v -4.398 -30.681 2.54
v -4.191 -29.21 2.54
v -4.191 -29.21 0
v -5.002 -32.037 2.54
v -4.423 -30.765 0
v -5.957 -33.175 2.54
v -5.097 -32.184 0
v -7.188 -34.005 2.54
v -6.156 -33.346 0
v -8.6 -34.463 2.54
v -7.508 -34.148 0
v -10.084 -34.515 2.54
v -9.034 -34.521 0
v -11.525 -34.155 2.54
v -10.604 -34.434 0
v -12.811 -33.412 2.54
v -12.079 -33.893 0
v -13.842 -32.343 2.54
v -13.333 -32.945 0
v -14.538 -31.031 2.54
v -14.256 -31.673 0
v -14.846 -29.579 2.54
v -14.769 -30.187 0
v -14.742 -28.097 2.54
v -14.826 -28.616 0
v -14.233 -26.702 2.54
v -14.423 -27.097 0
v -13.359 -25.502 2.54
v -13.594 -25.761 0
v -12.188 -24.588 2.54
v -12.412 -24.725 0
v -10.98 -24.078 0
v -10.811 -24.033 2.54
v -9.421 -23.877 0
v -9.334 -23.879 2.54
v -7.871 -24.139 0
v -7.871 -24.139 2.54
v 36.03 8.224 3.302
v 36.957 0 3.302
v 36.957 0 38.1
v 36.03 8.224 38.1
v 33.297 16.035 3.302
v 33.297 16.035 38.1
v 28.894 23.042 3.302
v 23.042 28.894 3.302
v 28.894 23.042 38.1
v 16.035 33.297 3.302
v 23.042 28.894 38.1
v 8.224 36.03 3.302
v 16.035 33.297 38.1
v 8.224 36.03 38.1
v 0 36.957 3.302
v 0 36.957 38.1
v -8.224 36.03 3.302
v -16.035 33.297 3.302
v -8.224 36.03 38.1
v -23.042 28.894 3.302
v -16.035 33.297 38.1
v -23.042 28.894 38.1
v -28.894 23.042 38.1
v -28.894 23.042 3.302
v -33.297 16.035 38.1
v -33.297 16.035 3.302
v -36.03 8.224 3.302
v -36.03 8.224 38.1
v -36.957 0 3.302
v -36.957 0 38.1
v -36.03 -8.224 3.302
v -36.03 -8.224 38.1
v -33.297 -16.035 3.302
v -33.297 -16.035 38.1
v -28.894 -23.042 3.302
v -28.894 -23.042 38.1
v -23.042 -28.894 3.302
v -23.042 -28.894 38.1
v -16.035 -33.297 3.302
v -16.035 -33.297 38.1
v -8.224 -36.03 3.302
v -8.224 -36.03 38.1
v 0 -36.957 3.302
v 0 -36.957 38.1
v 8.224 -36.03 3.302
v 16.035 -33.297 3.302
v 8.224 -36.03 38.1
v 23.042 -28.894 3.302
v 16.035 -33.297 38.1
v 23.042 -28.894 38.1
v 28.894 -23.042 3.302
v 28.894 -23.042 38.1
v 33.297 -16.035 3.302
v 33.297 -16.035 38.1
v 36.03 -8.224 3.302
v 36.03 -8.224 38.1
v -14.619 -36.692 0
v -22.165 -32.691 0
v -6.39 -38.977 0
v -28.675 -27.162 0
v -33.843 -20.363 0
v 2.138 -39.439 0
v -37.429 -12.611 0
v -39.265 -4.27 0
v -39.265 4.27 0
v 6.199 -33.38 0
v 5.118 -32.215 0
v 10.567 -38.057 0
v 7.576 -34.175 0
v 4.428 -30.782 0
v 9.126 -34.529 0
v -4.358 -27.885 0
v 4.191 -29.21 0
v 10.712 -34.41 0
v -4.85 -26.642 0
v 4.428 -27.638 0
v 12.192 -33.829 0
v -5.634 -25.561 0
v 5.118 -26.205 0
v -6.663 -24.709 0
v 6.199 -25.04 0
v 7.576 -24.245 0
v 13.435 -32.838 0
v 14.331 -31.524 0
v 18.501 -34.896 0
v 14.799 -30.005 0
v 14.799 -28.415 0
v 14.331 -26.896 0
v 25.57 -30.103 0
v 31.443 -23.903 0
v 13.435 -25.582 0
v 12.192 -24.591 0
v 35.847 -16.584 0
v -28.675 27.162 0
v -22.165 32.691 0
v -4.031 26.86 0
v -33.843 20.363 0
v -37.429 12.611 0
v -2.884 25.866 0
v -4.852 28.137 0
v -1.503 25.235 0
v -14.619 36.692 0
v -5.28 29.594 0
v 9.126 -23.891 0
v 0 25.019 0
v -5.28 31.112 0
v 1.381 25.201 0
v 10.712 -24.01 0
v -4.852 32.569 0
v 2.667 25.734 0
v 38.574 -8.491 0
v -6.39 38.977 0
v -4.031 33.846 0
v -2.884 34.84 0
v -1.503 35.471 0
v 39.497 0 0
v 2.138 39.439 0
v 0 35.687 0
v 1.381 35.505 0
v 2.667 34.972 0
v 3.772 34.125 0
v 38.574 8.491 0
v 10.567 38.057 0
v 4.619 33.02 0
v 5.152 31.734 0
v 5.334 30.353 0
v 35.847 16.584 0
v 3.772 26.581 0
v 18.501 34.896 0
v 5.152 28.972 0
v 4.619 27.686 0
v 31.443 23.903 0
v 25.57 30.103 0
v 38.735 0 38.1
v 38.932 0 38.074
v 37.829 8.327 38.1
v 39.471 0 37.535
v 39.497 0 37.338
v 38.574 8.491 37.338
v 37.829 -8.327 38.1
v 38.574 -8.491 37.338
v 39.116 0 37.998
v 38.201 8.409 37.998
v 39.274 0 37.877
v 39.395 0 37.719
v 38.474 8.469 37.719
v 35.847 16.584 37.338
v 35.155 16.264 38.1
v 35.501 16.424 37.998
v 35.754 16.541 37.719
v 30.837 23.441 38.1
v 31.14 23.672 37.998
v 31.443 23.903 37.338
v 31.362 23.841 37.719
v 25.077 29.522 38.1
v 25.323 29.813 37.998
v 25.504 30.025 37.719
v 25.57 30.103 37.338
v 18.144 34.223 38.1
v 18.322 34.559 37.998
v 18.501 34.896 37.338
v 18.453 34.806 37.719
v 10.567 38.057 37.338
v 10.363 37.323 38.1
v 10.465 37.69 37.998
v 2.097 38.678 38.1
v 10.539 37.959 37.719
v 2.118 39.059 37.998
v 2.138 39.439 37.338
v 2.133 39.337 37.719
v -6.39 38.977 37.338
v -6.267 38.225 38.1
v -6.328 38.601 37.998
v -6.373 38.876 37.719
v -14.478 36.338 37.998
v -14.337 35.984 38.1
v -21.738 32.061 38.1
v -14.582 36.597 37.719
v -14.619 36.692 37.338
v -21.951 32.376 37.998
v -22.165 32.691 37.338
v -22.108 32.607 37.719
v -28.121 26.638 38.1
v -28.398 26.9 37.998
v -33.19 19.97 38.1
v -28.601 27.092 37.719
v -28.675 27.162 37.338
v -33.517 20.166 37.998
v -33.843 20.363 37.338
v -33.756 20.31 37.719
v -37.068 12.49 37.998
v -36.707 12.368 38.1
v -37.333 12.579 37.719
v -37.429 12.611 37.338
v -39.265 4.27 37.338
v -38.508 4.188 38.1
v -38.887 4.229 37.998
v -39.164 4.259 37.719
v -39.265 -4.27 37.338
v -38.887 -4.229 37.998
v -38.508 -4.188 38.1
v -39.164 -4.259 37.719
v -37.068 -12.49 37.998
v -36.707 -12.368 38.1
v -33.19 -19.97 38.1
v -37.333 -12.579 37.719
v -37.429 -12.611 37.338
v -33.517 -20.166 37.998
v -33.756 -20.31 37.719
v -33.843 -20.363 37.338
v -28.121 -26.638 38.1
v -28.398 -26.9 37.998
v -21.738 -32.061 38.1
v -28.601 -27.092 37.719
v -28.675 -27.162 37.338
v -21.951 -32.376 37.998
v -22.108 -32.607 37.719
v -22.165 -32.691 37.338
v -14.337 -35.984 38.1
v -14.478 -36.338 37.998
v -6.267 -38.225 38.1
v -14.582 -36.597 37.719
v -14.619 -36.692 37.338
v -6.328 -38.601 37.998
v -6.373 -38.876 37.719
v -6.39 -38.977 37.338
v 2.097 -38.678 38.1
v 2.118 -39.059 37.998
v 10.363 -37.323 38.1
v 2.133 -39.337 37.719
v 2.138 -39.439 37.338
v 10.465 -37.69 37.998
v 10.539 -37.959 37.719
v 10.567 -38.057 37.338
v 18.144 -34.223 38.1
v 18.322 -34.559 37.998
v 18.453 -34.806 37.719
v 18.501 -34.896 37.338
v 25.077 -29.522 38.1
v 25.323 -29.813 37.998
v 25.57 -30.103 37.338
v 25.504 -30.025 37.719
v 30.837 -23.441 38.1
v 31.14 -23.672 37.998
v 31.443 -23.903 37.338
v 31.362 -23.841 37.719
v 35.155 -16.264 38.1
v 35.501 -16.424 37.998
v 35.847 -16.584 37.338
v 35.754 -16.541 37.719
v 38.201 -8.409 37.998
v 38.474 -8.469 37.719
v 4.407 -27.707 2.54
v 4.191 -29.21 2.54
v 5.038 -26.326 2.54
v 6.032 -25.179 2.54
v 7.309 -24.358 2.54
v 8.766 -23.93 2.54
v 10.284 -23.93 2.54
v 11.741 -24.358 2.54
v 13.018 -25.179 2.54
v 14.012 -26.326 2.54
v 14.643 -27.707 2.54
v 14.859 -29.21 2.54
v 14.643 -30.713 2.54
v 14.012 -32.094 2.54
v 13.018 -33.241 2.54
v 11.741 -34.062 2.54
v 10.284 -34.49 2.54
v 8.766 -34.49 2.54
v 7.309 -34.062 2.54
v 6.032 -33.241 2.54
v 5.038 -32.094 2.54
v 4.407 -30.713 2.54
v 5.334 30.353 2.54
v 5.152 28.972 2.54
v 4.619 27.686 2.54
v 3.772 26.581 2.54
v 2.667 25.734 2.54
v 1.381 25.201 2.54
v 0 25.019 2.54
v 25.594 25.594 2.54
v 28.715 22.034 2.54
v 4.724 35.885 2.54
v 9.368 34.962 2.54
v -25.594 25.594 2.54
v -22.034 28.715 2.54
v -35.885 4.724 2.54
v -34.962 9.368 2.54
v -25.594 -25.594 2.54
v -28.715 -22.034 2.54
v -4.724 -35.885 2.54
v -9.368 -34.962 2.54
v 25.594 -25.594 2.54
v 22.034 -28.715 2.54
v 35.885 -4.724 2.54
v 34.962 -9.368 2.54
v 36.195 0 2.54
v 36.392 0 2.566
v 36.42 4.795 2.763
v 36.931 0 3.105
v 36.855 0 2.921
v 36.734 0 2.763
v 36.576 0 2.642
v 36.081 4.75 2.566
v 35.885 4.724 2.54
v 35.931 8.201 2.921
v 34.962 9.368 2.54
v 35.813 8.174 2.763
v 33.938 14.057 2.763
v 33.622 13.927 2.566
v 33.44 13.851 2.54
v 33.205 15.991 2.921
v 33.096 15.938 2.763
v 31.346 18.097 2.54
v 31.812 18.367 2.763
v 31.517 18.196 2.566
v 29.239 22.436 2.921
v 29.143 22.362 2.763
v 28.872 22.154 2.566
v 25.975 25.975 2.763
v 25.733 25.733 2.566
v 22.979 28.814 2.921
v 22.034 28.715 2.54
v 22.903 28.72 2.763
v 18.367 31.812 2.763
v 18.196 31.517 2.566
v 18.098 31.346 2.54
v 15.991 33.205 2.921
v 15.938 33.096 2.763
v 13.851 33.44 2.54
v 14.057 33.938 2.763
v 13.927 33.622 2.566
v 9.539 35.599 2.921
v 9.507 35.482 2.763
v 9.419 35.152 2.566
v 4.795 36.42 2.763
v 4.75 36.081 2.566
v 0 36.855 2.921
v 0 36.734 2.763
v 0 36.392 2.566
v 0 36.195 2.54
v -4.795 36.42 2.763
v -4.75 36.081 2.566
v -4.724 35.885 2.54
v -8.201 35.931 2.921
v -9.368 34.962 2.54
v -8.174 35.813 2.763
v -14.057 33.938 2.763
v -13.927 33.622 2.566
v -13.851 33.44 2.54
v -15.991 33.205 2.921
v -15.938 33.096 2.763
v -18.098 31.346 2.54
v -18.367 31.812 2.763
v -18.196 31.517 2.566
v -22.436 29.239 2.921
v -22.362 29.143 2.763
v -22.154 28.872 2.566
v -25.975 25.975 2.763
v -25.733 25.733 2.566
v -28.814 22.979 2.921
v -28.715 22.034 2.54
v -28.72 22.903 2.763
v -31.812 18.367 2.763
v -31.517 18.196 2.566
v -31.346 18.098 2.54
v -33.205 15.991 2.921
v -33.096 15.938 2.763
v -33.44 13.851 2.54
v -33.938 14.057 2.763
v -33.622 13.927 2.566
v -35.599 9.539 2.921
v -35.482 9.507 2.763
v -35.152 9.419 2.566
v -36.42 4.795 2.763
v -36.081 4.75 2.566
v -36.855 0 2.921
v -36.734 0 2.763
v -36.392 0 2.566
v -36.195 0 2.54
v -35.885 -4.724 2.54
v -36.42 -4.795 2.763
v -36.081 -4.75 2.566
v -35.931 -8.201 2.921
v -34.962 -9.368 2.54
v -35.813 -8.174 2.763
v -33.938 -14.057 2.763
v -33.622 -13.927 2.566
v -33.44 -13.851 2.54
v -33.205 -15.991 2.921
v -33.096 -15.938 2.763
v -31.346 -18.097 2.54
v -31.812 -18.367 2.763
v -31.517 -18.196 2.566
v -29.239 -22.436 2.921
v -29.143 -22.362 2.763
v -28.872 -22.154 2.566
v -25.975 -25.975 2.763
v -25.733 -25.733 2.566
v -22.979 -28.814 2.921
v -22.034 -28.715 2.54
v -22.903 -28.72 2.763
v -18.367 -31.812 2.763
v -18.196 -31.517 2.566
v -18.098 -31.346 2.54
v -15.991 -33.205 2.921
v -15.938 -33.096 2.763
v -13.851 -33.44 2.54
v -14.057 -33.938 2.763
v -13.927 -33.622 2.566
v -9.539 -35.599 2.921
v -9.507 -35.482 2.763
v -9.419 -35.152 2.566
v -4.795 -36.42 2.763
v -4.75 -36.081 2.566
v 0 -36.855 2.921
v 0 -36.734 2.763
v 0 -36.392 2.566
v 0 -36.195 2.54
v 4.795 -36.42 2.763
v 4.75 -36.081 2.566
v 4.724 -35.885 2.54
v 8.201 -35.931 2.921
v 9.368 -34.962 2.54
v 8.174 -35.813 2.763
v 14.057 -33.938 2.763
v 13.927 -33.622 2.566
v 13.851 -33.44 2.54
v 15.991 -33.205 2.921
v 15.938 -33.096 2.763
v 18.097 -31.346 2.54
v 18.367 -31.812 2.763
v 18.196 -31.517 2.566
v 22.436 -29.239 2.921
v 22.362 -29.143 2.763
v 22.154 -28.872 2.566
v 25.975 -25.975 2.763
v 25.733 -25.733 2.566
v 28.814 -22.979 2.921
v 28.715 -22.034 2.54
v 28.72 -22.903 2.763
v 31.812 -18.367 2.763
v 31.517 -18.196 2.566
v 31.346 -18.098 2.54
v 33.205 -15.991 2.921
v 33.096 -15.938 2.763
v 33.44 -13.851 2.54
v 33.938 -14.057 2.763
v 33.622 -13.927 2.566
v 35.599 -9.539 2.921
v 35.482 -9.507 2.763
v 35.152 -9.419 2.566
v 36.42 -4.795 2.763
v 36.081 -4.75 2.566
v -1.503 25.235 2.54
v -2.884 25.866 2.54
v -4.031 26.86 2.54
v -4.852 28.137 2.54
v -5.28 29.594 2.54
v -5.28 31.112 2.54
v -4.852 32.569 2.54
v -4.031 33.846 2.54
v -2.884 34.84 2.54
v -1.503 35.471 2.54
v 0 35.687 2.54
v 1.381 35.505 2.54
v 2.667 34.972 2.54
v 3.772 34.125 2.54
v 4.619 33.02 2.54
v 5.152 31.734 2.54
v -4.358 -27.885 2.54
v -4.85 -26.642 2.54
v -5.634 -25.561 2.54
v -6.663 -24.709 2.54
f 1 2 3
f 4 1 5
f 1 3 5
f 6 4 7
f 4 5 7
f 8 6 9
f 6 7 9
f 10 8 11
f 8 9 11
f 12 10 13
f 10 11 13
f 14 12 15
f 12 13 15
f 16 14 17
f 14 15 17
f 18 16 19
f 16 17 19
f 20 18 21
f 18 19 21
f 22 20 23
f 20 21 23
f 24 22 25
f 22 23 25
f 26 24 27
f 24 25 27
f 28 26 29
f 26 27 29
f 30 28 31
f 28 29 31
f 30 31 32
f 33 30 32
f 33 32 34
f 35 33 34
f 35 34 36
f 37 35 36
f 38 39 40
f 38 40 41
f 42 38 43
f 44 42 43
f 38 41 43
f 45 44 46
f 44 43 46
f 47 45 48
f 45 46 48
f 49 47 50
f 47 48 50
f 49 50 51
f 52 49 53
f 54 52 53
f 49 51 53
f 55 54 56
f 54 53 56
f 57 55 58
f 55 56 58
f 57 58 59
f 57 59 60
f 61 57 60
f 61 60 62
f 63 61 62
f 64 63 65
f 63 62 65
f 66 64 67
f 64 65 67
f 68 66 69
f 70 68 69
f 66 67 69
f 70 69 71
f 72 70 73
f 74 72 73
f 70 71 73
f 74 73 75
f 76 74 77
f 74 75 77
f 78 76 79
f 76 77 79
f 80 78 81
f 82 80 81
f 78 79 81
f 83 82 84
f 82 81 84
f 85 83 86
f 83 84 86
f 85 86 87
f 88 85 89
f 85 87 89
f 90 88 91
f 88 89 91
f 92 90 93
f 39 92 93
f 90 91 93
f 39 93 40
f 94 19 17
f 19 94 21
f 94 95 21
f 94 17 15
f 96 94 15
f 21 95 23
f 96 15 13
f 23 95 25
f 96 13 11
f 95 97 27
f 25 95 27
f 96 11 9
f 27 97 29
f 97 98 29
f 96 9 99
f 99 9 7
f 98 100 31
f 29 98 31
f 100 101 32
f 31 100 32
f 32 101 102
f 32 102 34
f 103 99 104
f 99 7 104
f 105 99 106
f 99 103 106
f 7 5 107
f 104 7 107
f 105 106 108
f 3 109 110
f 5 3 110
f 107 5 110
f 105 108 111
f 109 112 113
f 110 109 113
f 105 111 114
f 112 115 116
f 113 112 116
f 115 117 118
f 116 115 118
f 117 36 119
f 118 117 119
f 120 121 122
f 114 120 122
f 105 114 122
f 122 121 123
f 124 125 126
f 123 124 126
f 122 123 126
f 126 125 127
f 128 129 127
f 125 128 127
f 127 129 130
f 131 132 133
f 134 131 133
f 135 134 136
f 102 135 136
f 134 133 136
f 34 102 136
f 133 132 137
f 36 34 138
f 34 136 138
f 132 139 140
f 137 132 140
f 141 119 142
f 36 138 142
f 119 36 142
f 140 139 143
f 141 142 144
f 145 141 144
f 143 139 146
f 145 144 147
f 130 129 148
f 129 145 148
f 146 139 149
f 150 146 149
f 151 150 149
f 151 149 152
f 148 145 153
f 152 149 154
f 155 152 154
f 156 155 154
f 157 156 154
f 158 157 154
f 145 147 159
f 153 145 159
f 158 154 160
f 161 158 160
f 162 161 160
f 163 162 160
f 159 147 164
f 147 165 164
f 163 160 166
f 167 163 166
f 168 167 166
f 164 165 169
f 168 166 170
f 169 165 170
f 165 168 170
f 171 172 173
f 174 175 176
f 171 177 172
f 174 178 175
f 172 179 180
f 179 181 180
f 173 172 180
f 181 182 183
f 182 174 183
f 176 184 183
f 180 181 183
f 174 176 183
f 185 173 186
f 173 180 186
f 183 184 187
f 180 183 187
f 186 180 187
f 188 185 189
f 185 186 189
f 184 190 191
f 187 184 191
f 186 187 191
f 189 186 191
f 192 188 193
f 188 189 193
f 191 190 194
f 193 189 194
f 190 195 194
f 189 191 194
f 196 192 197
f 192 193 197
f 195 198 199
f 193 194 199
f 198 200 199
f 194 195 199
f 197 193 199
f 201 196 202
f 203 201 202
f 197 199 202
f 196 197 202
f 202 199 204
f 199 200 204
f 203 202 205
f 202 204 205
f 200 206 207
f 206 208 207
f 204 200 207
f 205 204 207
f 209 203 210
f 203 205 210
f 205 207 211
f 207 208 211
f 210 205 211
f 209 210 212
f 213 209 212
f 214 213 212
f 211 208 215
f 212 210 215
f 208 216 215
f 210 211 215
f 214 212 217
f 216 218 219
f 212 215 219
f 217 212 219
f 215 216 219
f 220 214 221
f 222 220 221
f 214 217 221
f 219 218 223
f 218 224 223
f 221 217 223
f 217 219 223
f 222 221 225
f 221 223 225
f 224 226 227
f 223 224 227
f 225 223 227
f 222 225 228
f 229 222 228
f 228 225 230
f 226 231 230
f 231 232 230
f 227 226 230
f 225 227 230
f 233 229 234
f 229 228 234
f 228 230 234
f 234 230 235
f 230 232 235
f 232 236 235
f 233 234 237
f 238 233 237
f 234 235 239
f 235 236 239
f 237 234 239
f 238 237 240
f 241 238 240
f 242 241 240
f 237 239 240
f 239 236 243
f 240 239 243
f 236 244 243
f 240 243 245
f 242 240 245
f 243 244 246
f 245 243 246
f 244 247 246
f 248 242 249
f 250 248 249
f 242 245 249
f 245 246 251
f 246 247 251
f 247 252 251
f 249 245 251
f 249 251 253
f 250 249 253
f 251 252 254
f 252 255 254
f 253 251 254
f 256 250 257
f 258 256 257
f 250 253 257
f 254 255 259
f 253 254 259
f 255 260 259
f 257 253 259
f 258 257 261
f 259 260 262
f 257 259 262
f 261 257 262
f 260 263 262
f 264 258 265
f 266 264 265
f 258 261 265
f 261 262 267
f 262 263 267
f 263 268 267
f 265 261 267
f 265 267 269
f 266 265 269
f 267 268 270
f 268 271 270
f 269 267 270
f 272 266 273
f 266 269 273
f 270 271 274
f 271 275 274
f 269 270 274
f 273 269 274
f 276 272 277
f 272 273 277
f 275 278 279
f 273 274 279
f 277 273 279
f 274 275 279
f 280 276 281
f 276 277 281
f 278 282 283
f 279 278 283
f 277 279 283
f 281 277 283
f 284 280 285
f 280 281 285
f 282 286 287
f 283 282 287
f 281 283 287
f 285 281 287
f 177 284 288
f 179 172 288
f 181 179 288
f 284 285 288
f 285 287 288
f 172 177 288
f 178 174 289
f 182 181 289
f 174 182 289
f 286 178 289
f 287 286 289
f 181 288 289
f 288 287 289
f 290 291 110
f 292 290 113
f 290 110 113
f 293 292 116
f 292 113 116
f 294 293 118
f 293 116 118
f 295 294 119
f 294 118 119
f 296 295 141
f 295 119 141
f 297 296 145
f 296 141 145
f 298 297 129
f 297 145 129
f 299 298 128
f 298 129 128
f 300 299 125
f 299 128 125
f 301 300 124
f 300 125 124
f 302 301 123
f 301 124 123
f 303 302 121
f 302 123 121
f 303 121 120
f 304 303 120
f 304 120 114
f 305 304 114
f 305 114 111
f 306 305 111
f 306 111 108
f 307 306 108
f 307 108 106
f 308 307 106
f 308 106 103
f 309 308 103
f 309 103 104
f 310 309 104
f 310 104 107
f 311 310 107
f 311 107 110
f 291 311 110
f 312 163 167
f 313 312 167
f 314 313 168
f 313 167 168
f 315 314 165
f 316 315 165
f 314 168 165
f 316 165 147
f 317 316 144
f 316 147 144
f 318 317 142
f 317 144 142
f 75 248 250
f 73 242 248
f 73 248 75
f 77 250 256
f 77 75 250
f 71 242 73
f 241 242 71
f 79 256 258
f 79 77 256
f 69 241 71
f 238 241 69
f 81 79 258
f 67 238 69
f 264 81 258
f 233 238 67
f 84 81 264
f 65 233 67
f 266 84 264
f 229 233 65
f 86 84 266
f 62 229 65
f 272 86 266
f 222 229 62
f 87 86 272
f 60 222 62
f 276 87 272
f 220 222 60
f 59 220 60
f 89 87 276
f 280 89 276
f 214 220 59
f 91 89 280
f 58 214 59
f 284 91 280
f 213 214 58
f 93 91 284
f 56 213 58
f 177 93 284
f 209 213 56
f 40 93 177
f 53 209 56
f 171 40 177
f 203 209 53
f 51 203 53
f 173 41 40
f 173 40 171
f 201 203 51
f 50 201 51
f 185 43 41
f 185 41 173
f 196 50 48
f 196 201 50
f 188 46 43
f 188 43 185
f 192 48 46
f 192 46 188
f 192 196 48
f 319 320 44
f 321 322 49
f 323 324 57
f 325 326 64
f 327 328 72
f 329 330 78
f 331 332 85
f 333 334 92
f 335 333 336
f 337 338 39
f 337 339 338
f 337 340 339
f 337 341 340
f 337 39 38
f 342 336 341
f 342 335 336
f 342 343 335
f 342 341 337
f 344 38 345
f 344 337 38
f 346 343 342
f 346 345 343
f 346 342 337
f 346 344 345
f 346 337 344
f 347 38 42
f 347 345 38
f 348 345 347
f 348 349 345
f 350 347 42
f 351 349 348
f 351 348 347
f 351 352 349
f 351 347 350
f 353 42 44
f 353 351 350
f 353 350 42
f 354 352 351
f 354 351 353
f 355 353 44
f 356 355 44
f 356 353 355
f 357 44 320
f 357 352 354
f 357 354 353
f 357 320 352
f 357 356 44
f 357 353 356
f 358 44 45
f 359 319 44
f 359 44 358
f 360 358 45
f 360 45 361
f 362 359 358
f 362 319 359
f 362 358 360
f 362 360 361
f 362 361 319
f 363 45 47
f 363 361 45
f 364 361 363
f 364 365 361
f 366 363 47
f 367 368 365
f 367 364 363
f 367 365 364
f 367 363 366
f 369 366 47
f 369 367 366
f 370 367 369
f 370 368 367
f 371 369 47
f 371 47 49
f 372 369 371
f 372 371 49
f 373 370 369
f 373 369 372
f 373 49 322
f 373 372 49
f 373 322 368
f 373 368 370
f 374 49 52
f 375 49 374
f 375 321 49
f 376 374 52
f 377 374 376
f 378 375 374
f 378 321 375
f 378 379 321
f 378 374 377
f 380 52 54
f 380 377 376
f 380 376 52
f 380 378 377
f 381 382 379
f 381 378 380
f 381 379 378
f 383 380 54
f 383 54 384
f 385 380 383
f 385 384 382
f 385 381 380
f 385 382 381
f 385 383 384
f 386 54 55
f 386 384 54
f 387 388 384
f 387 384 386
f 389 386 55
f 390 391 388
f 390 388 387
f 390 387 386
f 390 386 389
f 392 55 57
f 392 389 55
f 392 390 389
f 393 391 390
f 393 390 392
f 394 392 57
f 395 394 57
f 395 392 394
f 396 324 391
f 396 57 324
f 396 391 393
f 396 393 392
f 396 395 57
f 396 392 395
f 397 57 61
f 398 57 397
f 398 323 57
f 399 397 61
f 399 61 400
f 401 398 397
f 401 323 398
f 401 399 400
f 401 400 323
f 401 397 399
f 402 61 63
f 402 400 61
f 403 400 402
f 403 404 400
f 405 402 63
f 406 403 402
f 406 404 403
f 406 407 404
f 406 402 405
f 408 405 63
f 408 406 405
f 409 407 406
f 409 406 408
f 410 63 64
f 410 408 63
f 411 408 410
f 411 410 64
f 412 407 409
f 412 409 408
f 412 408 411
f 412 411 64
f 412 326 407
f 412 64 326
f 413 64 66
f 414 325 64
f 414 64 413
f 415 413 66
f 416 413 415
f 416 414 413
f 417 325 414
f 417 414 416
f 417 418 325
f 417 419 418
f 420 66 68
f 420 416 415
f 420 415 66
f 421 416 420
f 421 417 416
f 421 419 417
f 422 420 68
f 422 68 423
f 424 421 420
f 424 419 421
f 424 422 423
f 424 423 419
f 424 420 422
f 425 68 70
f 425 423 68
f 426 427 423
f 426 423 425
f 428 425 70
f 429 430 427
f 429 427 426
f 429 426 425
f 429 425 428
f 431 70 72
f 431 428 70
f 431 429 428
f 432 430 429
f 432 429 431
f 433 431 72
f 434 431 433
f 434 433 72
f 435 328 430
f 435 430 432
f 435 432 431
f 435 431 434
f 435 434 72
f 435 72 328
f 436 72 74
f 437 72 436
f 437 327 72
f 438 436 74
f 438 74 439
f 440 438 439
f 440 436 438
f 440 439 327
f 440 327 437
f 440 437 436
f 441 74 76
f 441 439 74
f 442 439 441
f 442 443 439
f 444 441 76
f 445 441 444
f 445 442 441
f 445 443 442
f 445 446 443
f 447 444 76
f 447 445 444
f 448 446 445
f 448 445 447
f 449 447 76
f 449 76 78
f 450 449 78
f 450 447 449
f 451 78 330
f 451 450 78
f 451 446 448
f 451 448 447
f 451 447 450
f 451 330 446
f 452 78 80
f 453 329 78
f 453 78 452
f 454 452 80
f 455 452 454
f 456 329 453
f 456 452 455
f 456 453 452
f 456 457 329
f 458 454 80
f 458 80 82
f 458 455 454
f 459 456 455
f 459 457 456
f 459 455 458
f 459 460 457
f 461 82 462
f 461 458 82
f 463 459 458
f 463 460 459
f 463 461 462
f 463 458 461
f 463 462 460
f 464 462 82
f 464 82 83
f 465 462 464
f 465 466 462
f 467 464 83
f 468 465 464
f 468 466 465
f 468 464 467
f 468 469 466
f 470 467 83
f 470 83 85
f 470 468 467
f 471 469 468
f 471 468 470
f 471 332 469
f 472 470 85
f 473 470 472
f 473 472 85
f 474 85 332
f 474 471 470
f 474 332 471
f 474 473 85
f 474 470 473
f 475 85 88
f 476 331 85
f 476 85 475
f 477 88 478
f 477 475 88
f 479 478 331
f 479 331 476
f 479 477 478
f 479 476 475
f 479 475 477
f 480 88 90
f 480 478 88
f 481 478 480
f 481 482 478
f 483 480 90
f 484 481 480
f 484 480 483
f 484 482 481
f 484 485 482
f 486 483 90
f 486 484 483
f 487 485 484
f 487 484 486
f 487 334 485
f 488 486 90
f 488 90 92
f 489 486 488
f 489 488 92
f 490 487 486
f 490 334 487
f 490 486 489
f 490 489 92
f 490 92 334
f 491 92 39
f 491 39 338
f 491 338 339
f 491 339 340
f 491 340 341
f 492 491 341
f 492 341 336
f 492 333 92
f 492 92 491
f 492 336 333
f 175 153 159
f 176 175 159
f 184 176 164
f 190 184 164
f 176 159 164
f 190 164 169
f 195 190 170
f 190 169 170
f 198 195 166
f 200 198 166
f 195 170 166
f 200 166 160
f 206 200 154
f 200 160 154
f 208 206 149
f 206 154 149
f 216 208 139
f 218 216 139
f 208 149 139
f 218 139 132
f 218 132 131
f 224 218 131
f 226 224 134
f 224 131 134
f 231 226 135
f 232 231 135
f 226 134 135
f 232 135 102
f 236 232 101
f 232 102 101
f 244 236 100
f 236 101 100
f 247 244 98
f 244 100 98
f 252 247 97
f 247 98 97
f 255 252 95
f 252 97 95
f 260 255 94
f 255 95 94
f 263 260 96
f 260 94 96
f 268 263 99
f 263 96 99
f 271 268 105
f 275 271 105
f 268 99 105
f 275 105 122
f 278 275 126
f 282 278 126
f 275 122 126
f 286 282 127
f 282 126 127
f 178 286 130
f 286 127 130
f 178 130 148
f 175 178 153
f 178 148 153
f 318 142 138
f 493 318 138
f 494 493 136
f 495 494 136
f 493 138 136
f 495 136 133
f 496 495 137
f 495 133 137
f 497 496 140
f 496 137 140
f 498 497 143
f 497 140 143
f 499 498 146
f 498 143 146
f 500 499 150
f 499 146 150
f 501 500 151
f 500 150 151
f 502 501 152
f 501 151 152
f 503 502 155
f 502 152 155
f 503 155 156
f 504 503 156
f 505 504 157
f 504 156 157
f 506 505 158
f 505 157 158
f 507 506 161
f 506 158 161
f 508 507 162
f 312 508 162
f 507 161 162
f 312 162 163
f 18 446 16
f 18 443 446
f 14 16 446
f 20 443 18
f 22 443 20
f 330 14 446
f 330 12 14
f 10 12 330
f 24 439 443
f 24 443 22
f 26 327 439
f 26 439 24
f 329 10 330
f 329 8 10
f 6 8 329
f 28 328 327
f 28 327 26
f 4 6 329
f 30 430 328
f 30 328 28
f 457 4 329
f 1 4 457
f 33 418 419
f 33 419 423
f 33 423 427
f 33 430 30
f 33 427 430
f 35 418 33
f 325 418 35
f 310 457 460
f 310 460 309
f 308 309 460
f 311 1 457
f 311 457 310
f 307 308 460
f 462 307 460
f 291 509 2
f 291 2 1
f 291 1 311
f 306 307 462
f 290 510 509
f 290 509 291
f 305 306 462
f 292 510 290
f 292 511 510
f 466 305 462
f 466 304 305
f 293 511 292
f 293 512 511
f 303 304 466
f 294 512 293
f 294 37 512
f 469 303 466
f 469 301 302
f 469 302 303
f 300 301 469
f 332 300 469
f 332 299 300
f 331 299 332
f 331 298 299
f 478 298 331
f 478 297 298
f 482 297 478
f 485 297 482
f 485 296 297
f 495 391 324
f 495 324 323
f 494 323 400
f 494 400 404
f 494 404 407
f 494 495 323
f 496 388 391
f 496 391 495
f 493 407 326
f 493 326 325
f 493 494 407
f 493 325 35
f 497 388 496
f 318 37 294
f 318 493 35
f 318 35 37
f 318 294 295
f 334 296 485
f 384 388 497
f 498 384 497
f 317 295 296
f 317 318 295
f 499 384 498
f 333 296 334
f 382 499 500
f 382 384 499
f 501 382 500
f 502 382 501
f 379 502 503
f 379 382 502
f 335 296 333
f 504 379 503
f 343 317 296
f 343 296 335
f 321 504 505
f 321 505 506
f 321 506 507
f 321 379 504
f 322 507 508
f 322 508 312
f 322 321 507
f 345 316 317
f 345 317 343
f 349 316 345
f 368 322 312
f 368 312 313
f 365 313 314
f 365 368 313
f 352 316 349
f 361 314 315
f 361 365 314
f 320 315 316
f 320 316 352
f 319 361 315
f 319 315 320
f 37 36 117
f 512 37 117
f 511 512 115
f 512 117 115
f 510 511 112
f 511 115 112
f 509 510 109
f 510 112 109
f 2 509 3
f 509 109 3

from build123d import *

# Parameters (mm, degrees)
F0_R     = 39.497
F1_DEPTH = 38.1
F2_R     = 36.957
F3_DEPTH = 35.56
F4_R     = 0.762
F5_R     = 0.762
F7_DEPTH = 25.4
F9_DEPTH = 25.4


with BuildPart() as f1:
    # F0 (on Top) → F1 (new body)
    with BuildSketch(Plane.XY):
        Circle(F0_R)
    extrude(amount=F1_DEPTH)

    # F2 (on face) → F3 (cut)
    with BuildSketch(Plane.XY.offset(38.1)):
        Circle(F2_R)
    extrude(amount=-F3_DEPTH, mode=Mode.SUBTRACT)

    # F4
    f4_edges = [f1.edges().sort_by_distance(p)[0] for p in [
        (-36.957, 0, 2.54),
    ]]
    fillet(f4_edges, radius=F4_R)

    # F5
    f5_edges = [f1.edges().sort_by_distance(p)[0] for p in [
        (-39.497, 0, 38.1),
    ]]
    fillet(f5_edges, radius=F5_R)

    # F6 (on face) → F7 (cut)
    with BuildSketch(Plane(origin=(0, 0, 0), x_dir=(1, 0, 0), z_dir=(0, 0, -1))):
        with BuildLine():
            Line((0, -25.019), (0, -30.353))
            Line((0, -30.353), (0, -35.687))
            ThreePointArc((0, -35.687), (3.771708, -34.124708), (5.334, -30.353))
            ThreePointArc((5.334, -30.353), (3.771708, -26.581292), (0, -25.019))
        make_face()
        with BuildLine():
            Line((0, -35.687), (0, -30.353))
            Line((0, -30.353), (0, -25.019))
            ThreePointArc((0, -25.019), (-5.334, -30.353), (0, -35.687))
        make_face()
    extrude(amount=-F7_DEPTH, mode=Mode.SUBTRACT)

    # F8 (on face) → F9 (cut)
    with BuildSketch(Plane(origin=(0, 0, 0), x_dir=(1, 0, 0), z_dir=(0, 0, -1))):
        with BuildLine():
            ThreePointArc((14.859, 29.21), (9.525, 34.544), (4.191, 29.21))
            ThreePointArc((4.191, 29.21), (9.525, 23.876), (14.859, 29.21))
        make_face()
        with BuildLine():
            ThreePointArc((-4.191, 29.21), (-13.841951, 32.342969), (-7.87135, 24.138807))
            Line((-7.87135, 24.138807), (-9.525, 29.21))
            Line((-9.525, 29.21), (-4.191, 29.21))
        make_face()
        with BuildLine():
            Line((-9.525, 29.21), (-7.87135, 24.138807))
            ThreePointArc((-7.87135, 24.138807), (-5.208049, 26.077031), (-4.191, 29.21))
            Line((-4.191, 29.21), (-9.525, 29.21))
        make_face()
    extrude(amount=-F9_DEPTH, mode=Mode.SUBTRACT)


solid = f1.part
